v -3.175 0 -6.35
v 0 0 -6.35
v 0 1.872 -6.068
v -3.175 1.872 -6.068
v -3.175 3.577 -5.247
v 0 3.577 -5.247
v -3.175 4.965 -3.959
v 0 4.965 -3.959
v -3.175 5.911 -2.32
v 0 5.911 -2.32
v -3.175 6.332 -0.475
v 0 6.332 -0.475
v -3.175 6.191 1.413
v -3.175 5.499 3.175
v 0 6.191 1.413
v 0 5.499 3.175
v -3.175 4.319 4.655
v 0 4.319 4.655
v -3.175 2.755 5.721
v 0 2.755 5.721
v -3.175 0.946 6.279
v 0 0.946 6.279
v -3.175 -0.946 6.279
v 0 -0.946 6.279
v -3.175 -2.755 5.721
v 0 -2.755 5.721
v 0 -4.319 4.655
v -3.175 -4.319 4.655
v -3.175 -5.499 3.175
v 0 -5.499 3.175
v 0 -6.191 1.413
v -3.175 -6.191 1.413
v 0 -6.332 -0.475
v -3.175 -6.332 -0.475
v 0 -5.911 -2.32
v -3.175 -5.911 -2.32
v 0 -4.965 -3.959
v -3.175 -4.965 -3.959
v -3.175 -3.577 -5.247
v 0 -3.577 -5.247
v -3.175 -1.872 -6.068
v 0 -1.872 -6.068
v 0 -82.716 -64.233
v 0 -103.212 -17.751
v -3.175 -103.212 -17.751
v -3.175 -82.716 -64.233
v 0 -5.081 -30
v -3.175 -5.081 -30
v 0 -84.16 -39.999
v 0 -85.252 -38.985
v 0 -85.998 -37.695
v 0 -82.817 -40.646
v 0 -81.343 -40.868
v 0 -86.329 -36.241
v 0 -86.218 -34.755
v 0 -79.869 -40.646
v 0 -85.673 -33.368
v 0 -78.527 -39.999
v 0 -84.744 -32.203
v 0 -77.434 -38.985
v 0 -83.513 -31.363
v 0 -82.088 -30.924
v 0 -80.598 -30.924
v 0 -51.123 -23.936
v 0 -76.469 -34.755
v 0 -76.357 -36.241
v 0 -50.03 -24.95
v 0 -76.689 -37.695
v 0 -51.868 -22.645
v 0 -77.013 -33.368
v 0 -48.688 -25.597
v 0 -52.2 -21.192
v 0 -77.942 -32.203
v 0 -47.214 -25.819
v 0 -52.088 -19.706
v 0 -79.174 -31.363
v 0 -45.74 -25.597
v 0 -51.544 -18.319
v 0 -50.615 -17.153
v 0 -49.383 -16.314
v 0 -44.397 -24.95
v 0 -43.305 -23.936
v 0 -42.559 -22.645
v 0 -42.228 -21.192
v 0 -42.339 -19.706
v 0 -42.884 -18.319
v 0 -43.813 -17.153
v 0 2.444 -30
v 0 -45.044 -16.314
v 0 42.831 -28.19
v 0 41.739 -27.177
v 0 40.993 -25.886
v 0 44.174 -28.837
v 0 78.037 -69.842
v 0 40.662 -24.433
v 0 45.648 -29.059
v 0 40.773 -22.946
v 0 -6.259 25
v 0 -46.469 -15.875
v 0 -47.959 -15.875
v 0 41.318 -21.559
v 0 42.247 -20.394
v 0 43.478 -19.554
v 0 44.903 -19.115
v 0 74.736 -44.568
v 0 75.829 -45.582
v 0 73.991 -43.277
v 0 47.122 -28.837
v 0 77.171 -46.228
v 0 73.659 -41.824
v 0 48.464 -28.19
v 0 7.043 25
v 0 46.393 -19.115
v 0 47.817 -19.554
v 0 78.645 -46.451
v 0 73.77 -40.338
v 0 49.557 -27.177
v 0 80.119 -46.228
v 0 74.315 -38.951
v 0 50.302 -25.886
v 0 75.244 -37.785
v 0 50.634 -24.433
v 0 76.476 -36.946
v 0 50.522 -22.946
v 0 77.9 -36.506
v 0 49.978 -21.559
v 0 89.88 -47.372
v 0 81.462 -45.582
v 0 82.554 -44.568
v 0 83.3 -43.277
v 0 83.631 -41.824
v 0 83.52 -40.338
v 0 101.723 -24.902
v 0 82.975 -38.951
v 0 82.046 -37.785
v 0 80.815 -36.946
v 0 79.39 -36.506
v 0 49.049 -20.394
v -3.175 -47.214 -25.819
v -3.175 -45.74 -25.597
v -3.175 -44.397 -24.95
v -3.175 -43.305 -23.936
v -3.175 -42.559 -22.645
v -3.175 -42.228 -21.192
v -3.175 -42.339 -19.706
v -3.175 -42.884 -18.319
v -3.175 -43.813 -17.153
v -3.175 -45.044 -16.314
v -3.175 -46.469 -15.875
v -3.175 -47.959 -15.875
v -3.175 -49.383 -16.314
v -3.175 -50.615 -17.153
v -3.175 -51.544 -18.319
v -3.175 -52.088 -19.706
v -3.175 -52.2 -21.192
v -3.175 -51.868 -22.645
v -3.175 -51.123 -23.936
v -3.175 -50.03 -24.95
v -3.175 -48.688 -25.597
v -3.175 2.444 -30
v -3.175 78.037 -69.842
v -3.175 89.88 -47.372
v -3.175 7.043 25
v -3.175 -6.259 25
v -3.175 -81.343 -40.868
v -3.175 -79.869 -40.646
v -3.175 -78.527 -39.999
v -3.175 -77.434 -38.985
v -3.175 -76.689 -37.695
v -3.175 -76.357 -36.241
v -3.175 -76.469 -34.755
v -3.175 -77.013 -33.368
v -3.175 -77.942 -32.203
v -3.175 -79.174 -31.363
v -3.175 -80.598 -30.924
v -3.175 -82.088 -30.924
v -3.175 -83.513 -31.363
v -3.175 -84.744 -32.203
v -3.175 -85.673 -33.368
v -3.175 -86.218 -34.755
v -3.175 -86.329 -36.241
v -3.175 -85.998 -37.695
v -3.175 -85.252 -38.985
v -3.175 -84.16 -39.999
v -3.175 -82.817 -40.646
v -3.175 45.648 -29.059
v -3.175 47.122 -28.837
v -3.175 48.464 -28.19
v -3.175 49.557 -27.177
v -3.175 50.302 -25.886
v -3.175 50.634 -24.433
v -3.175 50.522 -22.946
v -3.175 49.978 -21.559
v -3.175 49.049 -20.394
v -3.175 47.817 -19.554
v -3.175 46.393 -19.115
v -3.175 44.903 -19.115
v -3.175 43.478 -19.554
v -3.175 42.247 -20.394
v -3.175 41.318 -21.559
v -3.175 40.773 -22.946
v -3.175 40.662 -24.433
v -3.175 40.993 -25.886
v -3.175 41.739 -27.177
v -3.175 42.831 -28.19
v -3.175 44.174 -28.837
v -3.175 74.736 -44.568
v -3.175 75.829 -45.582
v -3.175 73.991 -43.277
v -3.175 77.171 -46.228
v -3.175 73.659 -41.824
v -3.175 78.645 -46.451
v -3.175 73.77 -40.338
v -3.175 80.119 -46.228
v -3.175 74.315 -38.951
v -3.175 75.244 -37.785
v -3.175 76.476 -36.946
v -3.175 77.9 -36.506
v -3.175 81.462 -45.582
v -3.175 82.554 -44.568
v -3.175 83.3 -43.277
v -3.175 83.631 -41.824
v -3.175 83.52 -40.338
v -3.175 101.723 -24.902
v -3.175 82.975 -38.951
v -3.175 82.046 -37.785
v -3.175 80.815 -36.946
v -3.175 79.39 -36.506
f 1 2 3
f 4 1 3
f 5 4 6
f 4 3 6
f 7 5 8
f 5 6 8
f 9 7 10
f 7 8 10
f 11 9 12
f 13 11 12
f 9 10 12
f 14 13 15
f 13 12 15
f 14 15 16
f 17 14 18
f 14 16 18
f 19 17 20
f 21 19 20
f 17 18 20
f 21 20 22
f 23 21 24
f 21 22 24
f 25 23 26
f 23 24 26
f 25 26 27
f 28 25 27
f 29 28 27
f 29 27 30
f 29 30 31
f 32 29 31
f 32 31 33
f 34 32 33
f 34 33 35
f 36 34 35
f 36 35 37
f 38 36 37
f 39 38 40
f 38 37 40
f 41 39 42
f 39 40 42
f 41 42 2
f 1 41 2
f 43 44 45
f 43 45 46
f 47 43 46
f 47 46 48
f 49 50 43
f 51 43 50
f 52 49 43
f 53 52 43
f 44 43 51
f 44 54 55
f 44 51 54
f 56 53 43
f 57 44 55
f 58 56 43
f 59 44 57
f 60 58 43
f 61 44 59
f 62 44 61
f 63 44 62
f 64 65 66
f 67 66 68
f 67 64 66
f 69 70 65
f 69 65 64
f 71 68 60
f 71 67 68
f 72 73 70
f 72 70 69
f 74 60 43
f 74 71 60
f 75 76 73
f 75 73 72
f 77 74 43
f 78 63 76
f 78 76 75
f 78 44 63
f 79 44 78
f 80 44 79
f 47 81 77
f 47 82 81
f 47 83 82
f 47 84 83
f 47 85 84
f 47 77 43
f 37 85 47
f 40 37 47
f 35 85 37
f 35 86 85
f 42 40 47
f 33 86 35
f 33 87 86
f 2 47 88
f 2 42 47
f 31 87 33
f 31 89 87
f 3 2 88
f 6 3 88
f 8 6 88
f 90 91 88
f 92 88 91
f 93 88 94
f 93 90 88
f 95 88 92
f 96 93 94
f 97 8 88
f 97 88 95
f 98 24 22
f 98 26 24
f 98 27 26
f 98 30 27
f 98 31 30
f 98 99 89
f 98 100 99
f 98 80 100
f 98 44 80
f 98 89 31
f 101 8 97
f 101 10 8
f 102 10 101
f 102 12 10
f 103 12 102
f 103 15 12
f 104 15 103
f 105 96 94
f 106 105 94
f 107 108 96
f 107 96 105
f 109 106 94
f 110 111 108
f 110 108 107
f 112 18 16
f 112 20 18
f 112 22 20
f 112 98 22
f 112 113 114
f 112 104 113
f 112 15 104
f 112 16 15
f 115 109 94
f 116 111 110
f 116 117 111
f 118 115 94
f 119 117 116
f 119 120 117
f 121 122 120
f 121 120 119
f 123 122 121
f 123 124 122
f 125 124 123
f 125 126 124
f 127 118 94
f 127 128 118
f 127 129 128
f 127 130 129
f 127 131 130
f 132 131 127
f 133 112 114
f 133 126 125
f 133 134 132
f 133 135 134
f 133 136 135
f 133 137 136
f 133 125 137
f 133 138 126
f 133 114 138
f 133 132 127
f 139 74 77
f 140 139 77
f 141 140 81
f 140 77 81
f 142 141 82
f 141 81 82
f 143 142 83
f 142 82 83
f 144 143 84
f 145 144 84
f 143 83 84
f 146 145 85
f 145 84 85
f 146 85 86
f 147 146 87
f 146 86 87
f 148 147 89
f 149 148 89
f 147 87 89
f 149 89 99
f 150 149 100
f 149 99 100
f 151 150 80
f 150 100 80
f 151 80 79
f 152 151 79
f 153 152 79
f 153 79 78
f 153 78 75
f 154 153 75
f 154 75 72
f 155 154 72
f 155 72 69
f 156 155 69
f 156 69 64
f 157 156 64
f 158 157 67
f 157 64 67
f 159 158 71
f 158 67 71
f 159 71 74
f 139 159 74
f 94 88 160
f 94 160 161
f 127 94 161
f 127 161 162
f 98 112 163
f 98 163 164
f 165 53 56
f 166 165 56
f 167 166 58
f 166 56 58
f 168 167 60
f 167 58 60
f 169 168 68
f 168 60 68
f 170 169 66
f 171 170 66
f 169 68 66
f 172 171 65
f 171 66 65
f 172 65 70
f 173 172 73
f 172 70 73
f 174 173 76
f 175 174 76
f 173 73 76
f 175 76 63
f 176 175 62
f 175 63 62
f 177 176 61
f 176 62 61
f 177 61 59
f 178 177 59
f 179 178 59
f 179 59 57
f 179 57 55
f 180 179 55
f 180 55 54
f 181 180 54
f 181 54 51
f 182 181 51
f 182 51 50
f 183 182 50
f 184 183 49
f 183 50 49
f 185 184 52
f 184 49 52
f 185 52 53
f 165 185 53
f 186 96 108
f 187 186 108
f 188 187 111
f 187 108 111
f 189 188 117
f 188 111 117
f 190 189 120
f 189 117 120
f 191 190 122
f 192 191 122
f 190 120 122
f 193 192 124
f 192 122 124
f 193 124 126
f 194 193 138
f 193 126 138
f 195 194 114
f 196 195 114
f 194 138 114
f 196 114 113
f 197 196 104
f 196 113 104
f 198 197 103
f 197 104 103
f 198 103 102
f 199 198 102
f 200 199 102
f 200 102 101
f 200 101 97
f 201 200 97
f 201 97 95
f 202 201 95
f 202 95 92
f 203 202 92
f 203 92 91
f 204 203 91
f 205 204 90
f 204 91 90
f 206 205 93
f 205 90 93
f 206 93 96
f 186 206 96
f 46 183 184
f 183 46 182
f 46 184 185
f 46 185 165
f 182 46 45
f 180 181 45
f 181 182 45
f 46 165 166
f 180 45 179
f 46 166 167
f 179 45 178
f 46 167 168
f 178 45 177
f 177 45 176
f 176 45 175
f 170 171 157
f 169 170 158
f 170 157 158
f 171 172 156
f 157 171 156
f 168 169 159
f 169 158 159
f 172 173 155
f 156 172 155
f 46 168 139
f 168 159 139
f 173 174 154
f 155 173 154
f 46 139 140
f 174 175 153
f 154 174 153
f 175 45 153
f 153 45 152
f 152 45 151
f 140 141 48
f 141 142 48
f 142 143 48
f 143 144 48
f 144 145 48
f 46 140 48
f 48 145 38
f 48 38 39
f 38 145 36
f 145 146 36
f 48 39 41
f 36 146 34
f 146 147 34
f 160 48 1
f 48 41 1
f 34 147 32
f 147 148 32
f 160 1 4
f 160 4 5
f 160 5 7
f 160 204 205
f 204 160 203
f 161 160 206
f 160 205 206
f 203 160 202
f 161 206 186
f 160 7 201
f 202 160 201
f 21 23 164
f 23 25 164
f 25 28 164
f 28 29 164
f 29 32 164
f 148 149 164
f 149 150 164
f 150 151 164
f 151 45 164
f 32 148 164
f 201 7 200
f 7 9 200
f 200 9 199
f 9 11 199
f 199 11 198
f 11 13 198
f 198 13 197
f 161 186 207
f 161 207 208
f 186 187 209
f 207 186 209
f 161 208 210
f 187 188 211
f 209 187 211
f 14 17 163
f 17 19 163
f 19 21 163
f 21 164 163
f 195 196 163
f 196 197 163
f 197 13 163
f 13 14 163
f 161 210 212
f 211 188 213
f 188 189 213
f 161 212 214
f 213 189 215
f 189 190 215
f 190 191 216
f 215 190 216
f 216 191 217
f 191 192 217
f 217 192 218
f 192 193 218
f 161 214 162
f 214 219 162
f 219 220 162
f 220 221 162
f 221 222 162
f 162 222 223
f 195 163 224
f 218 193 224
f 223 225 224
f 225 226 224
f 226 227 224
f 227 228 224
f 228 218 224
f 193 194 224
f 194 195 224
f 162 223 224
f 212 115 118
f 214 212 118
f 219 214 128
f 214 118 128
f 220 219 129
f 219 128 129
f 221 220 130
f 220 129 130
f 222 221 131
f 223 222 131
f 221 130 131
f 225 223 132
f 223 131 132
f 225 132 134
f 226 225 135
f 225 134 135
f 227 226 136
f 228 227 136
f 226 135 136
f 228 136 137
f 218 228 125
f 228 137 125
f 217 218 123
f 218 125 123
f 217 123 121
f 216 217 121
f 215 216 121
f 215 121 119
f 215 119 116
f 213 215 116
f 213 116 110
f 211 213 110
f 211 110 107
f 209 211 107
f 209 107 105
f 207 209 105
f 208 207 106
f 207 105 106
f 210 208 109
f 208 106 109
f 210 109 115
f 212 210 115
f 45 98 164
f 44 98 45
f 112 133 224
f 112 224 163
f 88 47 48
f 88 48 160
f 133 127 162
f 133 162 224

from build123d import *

# Parameters (mm, degrees)
SKETCH1_R           = 6.35
SKETCH1_R_2         = 5
BOSS_EXTRUDE1_DEPTH = 3.175


with BuildPart() as part:
    # Sketch1 → Boss-Extrude1 (new body)
    with BuildSketch(Plane.YZ):
        Polygon((-92.963597619, -40.991822572), (-82.715641976, -64.232721977), (-5.080718921, -30), (2.443726878, -30), (78.037119616, -69.842164643), (89.880151319, -47.372126813), (101.723183023, -24.902088983), (7.042880264, 25), (-6.258566793, 25), (-103.211553262, -17.750923167), align=None)
        with Locations(Location((0, 0, 0), (0, 0, 270))):
            Circle(SKETCH1_R, mode=Mode.SUBTRACT)
        with Locations(Location((-81.343147916, -35.867844751, 0), (0, 0, 270))):
            Circle(SKETCH1_R_2, mode=Mode.SUBTRACT)
        with Locations(Location((-47.213795641, -20.818681542, 0), (0, 0, 270))):
            Circle(SKETCH1_R_2, mode=Mode.SUBTRACT)
        with Locations(Location((78.645132405, -41.450610961, 0), (0, 0, 270))):
            Circle(SKETCH1_R_2, mode=Mode.SUBTRACT)
        with Locations(Location((45.647793387, -24.059072279, 0), (0, 0, 270))):
            Circle(SKETCH1_R_2, mode=Mode.SUBTRACT)
    extrude(amount=-BOSS_EXTRUDE1_DEPTH)


solid = part.part
